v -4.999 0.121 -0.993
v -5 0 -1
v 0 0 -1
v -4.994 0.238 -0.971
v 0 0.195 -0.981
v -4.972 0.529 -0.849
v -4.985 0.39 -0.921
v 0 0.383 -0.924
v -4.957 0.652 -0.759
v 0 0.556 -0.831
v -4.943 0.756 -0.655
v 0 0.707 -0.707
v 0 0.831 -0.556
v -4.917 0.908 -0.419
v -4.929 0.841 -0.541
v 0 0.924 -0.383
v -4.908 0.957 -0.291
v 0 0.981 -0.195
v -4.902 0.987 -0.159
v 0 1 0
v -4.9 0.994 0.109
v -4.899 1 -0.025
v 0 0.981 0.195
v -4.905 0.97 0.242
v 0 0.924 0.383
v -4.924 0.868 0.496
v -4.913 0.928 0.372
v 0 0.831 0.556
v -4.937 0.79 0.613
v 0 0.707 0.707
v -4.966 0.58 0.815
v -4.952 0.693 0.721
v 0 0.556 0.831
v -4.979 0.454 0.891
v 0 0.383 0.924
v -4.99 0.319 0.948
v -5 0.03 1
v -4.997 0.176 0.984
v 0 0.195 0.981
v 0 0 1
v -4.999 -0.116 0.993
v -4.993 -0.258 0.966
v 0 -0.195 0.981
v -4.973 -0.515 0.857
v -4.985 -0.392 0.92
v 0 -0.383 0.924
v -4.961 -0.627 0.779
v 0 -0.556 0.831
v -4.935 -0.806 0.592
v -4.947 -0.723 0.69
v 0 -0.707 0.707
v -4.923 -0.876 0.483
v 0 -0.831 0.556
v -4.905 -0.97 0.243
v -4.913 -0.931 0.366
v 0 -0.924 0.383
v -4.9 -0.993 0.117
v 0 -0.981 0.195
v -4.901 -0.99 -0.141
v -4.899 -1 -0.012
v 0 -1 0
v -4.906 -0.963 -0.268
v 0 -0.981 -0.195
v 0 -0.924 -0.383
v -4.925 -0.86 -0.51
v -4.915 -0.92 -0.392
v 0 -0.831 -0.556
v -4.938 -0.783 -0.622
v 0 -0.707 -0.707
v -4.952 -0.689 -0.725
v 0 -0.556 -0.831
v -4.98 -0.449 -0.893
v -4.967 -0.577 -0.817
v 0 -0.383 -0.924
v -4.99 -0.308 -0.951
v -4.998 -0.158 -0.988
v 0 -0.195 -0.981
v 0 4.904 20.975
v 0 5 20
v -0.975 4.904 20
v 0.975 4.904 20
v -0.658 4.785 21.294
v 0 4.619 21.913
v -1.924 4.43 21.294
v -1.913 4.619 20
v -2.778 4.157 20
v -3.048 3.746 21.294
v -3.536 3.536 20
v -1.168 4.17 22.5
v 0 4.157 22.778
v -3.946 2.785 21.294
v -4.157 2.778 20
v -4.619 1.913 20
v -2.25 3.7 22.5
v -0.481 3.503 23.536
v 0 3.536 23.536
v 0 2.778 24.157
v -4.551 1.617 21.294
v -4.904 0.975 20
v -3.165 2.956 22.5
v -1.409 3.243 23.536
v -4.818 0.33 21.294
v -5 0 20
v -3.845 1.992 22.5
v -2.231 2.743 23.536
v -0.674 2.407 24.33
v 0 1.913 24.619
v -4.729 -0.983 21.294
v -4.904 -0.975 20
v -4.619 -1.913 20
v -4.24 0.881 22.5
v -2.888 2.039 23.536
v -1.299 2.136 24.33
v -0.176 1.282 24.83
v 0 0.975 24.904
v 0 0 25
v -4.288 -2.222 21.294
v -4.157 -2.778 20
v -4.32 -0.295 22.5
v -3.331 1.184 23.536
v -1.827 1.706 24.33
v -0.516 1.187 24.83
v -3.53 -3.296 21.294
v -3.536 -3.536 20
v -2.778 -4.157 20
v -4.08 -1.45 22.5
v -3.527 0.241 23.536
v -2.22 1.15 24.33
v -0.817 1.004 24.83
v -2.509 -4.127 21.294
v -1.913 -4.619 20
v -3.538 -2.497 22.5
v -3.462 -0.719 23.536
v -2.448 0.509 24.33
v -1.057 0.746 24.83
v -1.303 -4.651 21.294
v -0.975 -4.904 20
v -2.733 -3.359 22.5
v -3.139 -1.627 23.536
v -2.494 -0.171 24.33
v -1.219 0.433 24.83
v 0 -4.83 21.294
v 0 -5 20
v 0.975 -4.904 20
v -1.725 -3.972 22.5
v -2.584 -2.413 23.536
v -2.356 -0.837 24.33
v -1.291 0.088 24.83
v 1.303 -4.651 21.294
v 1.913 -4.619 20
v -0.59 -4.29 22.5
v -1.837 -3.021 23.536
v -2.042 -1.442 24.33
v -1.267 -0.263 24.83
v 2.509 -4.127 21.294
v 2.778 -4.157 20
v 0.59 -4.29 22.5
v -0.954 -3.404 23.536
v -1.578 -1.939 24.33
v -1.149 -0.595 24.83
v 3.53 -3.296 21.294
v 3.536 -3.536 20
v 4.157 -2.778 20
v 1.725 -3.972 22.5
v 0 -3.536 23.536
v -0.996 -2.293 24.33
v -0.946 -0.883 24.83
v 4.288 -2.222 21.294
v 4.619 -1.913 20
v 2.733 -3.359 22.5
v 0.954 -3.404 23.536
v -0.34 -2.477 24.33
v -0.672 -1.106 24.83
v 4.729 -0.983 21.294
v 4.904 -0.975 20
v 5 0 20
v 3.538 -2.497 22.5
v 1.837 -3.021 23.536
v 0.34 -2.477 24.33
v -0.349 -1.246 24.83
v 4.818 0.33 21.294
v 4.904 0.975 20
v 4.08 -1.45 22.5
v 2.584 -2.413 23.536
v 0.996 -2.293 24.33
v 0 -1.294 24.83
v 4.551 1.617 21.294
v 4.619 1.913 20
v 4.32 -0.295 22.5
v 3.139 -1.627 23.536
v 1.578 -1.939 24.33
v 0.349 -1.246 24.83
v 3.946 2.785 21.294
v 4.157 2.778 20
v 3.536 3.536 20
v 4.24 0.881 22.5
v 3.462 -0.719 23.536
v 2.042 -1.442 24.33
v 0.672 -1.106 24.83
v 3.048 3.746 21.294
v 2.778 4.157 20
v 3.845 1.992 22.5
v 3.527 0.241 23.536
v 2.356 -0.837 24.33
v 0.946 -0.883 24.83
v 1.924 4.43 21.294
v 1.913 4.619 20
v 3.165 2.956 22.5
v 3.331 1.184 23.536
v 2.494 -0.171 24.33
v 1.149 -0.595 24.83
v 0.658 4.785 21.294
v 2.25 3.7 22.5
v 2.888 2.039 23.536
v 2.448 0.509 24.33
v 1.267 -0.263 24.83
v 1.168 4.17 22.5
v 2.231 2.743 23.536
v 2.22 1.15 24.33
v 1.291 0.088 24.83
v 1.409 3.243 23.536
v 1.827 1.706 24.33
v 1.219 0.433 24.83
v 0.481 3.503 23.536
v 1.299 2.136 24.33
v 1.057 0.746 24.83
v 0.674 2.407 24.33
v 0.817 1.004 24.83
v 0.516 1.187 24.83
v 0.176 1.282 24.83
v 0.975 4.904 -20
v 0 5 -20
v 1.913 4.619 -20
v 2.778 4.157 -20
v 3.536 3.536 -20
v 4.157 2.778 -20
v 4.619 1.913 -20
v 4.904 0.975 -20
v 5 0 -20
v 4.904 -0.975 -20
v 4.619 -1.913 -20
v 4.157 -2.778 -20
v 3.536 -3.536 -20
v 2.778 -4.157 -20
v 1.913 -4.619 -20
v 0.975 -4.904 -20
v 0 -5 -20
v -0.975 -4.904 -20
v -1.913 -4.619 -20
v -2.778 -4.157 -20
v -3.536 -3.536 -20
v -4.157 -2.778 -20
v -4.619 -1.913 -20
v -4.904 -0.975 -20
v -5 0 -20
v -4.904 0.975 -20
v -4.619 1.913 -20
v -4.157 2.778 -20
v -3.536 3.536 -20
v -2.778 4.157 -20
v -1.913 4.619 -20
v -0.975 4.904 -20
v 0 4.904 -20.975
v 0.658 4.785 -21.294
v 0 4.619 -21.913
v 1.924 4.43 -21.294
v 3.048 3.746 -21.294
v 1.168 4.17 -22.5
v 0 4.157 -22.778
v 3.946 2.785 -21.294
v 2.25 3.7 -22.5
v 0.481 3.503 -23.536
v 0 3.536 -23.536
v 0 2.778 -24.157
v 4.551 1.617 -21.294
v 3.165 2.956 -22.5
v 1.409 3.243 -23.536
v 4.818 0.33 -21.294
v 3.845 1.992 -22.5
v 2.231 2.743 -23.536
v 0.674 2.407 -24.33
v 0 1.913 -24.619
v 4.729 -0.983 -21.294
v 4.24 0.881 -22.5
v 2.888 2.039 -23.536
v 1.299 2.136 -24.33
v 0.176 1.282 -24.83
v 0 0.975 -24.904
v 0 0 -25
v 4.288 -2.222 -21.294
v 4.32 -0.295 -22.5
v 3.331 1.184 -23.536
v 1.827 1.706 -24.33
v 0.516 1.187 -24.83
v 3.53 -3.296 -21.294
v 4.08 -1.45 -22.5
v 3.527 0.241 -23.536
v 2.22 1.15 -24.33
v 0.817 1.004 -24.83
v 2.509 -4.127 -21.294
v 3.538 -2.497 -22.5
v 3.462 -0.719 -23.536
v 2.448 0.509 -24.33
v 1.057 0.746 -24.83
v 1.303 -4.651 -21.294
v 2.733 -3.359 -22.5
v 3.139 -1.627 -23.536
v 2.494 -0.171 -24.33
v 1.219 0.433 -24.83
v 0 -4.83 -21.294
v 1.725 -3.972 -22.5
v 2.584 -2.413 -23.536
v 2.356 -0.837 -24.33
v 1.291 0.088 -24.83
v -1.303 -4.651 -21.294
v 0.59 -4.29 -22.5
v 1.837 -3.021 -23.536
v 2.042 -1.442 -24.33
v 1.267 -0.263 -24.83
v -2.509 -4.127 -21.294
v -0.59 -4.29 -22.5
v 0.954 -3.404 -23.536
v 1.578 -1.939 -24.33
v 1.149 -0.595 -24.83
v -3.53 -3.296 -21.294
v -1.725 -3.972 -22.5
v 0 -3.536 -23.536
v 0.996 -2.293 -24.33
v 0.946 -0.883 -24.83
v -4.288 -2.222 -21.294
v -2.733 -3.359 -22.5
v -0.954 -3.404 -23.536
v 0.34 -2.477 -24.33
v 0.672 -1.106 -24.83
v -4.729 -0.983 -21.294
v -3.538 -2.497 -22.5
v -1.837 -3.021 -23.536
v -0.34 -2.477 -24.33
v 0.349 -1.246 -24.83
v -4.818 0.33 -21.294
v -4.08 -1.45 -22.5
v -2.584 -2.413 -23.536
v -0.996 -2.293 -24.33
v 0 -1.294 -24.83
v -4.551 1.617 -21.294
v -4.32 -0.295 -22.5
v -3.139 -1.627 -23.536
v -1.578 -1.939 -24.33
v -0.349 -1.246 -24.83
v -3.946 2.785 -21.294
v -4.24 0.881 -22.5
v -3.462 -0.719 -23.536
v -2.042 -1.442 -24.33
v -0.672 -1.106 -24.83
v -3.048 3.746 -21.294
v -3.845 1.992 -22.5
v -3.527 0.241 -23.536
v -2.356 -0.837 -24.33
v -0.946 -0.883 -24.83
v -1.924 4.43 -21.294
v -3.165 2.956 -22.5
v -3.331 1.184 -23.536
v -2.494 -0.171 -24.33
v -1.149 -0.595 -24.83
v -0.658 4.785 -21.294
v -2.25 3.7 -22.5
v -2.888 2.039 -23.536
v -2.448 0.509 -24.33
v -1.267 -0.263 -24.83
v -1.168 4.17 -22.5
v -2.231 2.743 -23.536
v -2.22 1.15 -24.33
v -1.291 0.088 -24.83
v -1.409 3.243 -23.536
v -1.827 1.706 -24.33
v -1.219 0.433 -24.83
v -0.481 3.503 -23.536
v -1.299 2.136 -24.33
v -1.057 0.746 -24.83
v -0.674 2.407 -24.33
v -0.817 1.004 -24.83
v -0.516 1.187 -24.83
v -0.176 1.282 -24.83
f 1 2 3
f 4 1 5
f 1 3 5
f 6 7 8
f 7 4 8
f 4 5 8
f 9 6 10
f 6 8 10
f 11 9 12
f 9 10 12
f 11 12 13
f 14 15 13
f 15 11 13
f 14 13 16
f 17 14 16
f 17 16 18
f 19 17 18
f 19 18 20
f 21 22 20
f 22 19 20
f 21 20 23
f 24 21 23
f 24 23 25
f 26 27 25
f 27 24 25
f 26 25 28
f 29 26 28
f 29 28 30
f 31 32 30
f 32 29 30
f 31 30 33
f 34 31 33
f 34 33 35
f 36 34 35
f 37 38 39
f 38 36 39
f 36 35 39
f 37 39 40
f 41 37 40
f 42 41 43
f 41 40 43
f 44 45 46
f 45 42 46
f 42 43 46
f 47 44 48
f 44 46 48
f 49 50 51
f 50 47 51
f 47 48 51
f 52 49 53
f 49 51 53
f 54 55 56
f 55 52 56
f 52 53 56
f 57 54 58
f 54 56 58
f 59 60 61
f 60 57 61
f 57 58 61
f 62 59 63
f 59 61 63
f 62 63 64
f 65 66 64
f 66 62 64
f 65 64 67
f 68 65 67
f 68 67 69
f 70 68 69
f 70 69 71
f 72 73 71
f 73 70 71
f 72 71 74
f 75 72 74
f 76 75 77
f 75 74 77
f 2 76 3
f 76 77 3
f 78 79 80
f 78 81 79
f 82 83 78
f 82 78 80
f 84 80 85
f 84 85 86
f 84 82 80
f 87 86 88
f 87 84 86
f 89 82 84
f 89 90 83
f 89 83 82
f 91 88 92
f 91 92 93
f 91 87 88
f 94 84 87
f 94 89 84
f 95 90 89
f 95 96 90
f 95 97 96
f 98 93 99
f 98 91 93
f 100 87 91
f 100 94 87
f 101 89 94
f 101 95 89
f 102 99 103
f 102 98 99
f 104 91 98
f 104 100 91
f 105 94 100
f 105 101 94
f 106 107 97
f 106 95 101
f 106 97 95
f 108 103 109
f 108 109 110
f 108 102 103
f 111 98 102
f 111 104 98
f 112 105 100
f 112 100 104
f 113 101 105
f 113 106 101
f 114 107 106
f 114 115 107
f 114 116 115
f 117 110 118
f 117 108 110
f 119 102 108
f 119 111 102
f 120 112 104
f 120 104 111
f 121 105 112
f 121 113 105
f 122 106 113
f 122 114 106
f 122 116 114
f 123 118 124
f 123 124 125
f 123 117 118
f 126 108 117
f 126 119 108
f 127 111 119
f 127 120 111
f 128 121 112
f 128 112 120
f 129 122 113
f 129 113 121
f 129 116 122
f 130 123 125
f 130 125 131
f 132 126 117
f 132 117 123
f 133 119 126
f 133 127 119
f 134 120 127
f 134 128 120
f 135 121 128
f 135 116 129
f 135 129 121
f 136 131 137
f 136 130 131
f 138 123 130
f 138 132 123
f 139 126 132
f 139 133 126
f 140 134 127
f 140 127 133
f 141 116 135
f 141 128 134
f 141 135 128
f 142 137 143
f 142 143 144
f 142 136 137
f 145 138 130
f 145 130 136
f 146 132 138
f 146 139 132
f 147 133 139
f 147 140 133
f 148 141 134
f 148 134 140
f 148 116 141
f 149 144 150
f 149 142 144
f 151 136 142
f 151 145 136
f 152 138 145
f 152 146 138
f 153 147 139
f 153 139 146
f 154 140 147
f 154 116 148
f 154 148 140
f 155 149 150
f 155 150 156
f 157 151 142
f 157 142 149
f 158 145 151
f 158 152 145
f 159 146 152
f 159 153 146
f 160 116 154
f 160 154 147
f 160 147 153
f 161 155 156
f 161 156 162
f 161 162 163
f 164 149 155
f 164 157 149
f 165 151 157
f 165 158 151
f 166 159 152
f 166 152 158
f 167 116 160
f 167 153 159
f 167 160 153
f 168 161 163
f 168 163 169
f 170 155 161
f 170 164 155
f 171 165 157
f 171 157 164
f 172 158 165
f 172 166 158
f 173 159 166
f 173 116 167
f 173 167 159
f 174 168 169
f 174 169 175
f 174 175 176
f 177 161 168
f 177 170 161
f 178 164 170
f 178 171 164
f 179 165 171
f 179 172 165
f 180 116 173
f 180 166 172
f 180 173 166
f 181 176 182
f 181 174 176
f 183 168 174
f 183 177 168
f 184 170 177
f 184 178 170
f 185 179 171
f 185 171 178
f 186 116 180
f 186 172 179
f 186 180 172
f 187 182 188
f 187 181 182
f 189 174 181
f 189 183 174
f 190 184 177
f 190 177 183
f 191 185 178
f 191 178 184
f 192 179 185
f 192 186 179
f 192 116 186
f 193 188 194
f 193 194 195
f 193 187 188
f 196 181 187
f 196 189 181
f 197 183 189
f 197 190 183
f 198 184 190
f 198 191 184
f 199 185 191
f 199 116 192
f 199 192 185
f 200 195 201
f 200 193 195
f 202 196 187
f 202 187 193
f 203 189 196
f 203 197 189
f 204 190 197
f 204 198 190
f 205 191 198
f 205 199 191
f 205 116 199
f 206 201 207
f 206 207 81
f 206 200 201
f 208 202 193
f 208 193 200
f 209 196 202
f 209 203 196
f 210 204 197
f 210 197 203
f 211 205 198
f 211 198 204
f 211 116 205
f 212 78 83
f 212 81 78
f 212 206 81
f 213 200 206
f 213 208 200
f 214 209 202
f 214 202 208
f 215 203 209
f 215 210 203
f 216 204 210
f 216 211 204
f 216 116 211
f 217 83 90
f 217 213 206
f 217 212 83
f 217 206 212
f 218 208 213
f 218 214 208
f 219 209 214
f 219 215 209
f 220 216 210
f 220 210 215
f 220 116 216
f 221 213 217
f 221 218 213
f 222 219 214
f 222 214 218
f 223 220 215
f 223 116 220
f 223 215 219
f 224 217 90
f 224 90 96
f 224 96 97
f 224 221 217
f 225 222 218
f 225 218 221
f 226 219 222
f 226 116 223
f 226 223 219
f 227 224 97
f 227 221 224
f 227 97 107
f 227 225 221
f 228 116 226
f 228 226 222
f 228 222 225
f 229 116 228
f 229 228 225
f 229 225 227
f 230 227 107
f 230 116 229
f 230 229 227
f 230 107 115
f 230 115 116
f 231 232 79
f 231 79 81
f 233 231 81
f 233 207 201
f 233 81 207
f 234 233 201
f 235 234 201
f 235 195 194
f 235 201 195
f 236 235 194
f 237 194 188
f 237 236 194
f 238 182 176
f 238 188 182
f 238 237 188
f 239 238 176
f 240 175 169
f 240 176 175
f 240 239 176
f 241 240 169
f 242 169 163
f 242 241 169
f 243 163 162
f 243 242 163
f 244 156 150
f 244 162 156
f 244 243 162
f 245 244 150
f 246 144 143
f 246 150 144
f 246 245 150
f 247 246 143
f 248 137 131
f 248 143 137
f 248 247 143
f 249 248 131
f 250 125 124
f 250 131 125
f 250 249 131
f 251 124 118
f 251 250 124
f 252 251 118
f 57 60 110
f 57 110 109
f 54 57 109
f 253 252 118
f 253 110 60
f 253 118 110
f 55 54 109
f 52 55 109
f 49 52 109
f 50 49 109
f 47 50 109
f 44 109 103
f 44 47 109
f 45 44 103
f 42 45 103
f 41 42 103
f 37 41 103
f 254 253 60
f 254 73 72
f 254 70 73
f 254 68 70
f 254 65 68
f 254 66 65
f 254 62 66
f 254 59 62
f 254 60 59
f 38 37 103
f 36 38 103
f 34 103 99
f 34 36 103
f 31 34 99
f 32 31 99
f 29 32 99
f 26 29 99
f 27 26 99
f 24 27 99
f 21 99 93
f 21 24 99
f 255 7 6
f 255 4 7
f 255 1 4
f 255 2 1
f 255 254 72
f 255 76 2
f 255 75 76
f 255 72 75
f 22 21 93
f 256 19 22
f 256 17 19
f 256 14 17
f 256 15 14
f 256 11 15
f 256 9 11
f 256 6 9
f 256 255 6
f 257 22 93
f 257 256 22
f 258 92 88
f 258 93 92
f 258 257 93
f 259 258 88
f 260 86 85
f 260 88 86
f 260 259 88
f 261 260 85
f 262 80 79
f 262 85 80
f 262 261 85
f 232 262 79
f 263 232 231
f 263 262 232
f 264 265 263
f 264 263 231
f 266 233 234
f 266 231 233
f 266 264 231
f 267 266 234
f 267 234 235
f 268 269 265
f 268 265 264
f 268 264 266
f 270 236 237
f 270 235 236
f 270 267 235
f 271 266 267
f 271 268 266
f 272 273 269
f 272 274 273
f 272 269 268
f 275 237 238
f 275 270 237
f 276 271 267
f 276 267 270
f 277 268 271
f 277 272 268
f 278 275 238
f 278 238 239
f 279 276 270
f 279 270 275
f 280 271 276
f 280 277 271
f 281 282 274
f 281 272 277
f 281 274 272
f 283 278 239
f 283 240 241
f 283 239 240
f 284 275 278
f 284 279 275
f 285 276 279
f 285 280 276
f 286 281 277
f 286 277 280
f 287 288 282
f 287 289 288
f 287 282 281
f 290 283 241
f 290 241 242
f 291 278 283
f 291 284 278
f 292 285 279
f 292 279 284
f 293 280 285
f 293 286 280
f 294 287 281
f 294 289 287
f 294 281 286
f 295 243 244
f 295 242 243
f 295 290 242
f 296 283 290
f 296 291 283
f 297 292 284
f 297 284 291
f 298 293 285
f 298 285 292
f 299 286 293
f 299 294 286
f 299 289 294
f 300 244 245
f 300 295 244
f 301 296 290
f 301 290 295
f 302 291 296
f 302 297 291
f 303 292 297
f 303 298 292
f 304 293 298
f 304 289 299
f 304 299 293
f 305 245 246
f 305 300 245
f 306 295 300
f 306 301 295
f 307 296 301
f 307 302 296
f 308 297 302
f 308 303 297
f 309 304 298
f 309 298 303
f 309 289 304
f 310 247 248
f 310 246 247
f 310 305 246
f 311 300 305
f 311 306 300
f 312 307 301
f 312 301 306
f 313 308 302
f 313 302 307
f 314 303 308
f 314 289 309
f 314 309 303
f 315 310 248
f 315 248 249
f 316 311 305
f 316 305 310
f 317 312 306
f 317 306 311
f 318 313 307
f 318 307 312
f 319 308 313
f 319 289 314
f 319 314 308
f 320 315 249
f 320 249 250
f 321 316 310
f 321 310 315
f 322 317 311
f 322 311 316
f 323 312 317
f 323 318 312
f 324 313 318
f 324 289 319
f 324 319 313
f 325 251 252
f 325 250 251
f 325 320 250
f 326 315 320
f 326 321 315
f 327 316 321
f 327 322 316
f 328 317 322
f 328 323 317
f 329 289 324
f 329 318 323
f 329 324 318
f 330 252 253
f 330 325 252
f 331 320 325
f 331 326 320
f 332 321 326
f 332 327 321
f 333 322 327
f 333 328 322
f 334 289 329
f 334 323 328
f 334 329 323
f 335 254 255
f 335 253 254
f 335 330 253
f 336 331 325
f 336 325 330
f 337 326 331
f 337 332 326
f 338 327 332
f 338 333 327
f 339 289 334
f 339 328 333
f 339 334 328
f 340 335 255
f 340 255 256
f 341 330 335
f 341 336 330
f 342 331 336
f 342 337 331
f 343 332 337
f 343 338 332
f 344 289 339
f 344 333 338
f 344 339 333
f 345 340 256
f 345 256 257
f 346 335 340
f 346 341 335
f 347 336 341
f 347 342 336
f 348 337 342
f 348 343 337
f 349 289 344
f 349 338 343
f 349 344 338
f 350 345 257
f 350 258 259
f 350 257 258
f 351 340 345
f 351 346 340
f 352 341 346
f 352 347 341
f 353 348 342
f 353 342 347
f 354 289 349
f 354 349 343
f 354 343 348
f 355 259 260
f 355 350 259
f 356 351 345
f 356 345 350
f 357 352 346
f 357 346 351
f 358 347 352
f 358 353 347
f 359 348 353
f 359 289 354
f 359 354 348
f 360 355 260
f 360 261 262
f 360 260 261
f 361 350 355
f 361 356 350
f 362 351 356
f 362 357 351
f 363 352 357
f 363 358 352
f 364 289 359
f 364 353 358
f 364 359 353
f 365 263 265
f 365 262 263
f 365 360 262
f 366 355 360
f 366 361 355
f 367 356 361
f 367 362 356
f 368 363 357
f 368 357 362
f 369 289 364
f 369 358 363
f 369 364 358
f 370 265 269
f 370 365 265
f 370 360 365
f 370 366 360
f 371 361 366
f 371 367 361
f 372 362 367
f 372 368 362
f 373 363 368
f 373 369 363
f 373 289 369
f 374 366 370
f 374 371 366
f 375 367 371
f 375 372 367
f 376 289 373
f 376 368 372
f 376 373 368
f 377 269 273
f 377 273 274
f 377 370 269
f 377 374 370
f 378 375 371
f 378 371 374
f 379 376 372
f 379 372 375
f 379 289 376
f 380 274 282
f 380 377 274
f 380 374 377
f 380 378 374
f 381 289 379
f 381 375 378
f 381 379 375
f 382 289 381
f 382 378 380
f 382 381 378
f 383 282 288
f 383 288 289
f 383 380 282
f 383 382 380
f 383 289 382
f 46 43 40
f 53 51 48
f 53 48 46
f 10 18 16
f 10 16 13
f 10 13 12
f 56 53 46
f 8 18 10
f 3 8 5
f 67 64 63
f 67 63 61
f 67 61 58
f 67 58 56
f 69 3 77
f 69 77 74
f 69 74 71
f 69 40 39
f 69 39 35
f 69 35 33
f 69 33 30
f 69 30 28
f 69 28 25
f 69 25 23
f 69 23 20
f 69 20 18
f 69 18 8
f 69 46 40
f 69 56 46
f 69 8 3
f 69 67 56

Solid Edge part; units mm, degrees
sketch "Sketch1" plane through (0, 0, 0) normal (1, 0, 0) x (0, 1, 0)
  line L0 (5, 25) -> (5, -25)
  line L1 (5, -25) -> (0, -25)
  line L2 (0, -25) -> (0, 0)
  line L3 (0, 0) -> (0, 25)
  line L4 (0, 25) -> (5, 25)
revolve "RevolvedProtrusion1" add sketch "Sketch1" angle 360 about axis through (0, 0, 0) along (0, 0, 1)
fillet "Round1" radius 5 2 edges at (-5, 0, 25) (-5, 0, -25)
hole "Hole_1" at (0, 0, 0) direction (-1, 0, 0) diameter 2 end up to next
properties material "Stainless steel"
